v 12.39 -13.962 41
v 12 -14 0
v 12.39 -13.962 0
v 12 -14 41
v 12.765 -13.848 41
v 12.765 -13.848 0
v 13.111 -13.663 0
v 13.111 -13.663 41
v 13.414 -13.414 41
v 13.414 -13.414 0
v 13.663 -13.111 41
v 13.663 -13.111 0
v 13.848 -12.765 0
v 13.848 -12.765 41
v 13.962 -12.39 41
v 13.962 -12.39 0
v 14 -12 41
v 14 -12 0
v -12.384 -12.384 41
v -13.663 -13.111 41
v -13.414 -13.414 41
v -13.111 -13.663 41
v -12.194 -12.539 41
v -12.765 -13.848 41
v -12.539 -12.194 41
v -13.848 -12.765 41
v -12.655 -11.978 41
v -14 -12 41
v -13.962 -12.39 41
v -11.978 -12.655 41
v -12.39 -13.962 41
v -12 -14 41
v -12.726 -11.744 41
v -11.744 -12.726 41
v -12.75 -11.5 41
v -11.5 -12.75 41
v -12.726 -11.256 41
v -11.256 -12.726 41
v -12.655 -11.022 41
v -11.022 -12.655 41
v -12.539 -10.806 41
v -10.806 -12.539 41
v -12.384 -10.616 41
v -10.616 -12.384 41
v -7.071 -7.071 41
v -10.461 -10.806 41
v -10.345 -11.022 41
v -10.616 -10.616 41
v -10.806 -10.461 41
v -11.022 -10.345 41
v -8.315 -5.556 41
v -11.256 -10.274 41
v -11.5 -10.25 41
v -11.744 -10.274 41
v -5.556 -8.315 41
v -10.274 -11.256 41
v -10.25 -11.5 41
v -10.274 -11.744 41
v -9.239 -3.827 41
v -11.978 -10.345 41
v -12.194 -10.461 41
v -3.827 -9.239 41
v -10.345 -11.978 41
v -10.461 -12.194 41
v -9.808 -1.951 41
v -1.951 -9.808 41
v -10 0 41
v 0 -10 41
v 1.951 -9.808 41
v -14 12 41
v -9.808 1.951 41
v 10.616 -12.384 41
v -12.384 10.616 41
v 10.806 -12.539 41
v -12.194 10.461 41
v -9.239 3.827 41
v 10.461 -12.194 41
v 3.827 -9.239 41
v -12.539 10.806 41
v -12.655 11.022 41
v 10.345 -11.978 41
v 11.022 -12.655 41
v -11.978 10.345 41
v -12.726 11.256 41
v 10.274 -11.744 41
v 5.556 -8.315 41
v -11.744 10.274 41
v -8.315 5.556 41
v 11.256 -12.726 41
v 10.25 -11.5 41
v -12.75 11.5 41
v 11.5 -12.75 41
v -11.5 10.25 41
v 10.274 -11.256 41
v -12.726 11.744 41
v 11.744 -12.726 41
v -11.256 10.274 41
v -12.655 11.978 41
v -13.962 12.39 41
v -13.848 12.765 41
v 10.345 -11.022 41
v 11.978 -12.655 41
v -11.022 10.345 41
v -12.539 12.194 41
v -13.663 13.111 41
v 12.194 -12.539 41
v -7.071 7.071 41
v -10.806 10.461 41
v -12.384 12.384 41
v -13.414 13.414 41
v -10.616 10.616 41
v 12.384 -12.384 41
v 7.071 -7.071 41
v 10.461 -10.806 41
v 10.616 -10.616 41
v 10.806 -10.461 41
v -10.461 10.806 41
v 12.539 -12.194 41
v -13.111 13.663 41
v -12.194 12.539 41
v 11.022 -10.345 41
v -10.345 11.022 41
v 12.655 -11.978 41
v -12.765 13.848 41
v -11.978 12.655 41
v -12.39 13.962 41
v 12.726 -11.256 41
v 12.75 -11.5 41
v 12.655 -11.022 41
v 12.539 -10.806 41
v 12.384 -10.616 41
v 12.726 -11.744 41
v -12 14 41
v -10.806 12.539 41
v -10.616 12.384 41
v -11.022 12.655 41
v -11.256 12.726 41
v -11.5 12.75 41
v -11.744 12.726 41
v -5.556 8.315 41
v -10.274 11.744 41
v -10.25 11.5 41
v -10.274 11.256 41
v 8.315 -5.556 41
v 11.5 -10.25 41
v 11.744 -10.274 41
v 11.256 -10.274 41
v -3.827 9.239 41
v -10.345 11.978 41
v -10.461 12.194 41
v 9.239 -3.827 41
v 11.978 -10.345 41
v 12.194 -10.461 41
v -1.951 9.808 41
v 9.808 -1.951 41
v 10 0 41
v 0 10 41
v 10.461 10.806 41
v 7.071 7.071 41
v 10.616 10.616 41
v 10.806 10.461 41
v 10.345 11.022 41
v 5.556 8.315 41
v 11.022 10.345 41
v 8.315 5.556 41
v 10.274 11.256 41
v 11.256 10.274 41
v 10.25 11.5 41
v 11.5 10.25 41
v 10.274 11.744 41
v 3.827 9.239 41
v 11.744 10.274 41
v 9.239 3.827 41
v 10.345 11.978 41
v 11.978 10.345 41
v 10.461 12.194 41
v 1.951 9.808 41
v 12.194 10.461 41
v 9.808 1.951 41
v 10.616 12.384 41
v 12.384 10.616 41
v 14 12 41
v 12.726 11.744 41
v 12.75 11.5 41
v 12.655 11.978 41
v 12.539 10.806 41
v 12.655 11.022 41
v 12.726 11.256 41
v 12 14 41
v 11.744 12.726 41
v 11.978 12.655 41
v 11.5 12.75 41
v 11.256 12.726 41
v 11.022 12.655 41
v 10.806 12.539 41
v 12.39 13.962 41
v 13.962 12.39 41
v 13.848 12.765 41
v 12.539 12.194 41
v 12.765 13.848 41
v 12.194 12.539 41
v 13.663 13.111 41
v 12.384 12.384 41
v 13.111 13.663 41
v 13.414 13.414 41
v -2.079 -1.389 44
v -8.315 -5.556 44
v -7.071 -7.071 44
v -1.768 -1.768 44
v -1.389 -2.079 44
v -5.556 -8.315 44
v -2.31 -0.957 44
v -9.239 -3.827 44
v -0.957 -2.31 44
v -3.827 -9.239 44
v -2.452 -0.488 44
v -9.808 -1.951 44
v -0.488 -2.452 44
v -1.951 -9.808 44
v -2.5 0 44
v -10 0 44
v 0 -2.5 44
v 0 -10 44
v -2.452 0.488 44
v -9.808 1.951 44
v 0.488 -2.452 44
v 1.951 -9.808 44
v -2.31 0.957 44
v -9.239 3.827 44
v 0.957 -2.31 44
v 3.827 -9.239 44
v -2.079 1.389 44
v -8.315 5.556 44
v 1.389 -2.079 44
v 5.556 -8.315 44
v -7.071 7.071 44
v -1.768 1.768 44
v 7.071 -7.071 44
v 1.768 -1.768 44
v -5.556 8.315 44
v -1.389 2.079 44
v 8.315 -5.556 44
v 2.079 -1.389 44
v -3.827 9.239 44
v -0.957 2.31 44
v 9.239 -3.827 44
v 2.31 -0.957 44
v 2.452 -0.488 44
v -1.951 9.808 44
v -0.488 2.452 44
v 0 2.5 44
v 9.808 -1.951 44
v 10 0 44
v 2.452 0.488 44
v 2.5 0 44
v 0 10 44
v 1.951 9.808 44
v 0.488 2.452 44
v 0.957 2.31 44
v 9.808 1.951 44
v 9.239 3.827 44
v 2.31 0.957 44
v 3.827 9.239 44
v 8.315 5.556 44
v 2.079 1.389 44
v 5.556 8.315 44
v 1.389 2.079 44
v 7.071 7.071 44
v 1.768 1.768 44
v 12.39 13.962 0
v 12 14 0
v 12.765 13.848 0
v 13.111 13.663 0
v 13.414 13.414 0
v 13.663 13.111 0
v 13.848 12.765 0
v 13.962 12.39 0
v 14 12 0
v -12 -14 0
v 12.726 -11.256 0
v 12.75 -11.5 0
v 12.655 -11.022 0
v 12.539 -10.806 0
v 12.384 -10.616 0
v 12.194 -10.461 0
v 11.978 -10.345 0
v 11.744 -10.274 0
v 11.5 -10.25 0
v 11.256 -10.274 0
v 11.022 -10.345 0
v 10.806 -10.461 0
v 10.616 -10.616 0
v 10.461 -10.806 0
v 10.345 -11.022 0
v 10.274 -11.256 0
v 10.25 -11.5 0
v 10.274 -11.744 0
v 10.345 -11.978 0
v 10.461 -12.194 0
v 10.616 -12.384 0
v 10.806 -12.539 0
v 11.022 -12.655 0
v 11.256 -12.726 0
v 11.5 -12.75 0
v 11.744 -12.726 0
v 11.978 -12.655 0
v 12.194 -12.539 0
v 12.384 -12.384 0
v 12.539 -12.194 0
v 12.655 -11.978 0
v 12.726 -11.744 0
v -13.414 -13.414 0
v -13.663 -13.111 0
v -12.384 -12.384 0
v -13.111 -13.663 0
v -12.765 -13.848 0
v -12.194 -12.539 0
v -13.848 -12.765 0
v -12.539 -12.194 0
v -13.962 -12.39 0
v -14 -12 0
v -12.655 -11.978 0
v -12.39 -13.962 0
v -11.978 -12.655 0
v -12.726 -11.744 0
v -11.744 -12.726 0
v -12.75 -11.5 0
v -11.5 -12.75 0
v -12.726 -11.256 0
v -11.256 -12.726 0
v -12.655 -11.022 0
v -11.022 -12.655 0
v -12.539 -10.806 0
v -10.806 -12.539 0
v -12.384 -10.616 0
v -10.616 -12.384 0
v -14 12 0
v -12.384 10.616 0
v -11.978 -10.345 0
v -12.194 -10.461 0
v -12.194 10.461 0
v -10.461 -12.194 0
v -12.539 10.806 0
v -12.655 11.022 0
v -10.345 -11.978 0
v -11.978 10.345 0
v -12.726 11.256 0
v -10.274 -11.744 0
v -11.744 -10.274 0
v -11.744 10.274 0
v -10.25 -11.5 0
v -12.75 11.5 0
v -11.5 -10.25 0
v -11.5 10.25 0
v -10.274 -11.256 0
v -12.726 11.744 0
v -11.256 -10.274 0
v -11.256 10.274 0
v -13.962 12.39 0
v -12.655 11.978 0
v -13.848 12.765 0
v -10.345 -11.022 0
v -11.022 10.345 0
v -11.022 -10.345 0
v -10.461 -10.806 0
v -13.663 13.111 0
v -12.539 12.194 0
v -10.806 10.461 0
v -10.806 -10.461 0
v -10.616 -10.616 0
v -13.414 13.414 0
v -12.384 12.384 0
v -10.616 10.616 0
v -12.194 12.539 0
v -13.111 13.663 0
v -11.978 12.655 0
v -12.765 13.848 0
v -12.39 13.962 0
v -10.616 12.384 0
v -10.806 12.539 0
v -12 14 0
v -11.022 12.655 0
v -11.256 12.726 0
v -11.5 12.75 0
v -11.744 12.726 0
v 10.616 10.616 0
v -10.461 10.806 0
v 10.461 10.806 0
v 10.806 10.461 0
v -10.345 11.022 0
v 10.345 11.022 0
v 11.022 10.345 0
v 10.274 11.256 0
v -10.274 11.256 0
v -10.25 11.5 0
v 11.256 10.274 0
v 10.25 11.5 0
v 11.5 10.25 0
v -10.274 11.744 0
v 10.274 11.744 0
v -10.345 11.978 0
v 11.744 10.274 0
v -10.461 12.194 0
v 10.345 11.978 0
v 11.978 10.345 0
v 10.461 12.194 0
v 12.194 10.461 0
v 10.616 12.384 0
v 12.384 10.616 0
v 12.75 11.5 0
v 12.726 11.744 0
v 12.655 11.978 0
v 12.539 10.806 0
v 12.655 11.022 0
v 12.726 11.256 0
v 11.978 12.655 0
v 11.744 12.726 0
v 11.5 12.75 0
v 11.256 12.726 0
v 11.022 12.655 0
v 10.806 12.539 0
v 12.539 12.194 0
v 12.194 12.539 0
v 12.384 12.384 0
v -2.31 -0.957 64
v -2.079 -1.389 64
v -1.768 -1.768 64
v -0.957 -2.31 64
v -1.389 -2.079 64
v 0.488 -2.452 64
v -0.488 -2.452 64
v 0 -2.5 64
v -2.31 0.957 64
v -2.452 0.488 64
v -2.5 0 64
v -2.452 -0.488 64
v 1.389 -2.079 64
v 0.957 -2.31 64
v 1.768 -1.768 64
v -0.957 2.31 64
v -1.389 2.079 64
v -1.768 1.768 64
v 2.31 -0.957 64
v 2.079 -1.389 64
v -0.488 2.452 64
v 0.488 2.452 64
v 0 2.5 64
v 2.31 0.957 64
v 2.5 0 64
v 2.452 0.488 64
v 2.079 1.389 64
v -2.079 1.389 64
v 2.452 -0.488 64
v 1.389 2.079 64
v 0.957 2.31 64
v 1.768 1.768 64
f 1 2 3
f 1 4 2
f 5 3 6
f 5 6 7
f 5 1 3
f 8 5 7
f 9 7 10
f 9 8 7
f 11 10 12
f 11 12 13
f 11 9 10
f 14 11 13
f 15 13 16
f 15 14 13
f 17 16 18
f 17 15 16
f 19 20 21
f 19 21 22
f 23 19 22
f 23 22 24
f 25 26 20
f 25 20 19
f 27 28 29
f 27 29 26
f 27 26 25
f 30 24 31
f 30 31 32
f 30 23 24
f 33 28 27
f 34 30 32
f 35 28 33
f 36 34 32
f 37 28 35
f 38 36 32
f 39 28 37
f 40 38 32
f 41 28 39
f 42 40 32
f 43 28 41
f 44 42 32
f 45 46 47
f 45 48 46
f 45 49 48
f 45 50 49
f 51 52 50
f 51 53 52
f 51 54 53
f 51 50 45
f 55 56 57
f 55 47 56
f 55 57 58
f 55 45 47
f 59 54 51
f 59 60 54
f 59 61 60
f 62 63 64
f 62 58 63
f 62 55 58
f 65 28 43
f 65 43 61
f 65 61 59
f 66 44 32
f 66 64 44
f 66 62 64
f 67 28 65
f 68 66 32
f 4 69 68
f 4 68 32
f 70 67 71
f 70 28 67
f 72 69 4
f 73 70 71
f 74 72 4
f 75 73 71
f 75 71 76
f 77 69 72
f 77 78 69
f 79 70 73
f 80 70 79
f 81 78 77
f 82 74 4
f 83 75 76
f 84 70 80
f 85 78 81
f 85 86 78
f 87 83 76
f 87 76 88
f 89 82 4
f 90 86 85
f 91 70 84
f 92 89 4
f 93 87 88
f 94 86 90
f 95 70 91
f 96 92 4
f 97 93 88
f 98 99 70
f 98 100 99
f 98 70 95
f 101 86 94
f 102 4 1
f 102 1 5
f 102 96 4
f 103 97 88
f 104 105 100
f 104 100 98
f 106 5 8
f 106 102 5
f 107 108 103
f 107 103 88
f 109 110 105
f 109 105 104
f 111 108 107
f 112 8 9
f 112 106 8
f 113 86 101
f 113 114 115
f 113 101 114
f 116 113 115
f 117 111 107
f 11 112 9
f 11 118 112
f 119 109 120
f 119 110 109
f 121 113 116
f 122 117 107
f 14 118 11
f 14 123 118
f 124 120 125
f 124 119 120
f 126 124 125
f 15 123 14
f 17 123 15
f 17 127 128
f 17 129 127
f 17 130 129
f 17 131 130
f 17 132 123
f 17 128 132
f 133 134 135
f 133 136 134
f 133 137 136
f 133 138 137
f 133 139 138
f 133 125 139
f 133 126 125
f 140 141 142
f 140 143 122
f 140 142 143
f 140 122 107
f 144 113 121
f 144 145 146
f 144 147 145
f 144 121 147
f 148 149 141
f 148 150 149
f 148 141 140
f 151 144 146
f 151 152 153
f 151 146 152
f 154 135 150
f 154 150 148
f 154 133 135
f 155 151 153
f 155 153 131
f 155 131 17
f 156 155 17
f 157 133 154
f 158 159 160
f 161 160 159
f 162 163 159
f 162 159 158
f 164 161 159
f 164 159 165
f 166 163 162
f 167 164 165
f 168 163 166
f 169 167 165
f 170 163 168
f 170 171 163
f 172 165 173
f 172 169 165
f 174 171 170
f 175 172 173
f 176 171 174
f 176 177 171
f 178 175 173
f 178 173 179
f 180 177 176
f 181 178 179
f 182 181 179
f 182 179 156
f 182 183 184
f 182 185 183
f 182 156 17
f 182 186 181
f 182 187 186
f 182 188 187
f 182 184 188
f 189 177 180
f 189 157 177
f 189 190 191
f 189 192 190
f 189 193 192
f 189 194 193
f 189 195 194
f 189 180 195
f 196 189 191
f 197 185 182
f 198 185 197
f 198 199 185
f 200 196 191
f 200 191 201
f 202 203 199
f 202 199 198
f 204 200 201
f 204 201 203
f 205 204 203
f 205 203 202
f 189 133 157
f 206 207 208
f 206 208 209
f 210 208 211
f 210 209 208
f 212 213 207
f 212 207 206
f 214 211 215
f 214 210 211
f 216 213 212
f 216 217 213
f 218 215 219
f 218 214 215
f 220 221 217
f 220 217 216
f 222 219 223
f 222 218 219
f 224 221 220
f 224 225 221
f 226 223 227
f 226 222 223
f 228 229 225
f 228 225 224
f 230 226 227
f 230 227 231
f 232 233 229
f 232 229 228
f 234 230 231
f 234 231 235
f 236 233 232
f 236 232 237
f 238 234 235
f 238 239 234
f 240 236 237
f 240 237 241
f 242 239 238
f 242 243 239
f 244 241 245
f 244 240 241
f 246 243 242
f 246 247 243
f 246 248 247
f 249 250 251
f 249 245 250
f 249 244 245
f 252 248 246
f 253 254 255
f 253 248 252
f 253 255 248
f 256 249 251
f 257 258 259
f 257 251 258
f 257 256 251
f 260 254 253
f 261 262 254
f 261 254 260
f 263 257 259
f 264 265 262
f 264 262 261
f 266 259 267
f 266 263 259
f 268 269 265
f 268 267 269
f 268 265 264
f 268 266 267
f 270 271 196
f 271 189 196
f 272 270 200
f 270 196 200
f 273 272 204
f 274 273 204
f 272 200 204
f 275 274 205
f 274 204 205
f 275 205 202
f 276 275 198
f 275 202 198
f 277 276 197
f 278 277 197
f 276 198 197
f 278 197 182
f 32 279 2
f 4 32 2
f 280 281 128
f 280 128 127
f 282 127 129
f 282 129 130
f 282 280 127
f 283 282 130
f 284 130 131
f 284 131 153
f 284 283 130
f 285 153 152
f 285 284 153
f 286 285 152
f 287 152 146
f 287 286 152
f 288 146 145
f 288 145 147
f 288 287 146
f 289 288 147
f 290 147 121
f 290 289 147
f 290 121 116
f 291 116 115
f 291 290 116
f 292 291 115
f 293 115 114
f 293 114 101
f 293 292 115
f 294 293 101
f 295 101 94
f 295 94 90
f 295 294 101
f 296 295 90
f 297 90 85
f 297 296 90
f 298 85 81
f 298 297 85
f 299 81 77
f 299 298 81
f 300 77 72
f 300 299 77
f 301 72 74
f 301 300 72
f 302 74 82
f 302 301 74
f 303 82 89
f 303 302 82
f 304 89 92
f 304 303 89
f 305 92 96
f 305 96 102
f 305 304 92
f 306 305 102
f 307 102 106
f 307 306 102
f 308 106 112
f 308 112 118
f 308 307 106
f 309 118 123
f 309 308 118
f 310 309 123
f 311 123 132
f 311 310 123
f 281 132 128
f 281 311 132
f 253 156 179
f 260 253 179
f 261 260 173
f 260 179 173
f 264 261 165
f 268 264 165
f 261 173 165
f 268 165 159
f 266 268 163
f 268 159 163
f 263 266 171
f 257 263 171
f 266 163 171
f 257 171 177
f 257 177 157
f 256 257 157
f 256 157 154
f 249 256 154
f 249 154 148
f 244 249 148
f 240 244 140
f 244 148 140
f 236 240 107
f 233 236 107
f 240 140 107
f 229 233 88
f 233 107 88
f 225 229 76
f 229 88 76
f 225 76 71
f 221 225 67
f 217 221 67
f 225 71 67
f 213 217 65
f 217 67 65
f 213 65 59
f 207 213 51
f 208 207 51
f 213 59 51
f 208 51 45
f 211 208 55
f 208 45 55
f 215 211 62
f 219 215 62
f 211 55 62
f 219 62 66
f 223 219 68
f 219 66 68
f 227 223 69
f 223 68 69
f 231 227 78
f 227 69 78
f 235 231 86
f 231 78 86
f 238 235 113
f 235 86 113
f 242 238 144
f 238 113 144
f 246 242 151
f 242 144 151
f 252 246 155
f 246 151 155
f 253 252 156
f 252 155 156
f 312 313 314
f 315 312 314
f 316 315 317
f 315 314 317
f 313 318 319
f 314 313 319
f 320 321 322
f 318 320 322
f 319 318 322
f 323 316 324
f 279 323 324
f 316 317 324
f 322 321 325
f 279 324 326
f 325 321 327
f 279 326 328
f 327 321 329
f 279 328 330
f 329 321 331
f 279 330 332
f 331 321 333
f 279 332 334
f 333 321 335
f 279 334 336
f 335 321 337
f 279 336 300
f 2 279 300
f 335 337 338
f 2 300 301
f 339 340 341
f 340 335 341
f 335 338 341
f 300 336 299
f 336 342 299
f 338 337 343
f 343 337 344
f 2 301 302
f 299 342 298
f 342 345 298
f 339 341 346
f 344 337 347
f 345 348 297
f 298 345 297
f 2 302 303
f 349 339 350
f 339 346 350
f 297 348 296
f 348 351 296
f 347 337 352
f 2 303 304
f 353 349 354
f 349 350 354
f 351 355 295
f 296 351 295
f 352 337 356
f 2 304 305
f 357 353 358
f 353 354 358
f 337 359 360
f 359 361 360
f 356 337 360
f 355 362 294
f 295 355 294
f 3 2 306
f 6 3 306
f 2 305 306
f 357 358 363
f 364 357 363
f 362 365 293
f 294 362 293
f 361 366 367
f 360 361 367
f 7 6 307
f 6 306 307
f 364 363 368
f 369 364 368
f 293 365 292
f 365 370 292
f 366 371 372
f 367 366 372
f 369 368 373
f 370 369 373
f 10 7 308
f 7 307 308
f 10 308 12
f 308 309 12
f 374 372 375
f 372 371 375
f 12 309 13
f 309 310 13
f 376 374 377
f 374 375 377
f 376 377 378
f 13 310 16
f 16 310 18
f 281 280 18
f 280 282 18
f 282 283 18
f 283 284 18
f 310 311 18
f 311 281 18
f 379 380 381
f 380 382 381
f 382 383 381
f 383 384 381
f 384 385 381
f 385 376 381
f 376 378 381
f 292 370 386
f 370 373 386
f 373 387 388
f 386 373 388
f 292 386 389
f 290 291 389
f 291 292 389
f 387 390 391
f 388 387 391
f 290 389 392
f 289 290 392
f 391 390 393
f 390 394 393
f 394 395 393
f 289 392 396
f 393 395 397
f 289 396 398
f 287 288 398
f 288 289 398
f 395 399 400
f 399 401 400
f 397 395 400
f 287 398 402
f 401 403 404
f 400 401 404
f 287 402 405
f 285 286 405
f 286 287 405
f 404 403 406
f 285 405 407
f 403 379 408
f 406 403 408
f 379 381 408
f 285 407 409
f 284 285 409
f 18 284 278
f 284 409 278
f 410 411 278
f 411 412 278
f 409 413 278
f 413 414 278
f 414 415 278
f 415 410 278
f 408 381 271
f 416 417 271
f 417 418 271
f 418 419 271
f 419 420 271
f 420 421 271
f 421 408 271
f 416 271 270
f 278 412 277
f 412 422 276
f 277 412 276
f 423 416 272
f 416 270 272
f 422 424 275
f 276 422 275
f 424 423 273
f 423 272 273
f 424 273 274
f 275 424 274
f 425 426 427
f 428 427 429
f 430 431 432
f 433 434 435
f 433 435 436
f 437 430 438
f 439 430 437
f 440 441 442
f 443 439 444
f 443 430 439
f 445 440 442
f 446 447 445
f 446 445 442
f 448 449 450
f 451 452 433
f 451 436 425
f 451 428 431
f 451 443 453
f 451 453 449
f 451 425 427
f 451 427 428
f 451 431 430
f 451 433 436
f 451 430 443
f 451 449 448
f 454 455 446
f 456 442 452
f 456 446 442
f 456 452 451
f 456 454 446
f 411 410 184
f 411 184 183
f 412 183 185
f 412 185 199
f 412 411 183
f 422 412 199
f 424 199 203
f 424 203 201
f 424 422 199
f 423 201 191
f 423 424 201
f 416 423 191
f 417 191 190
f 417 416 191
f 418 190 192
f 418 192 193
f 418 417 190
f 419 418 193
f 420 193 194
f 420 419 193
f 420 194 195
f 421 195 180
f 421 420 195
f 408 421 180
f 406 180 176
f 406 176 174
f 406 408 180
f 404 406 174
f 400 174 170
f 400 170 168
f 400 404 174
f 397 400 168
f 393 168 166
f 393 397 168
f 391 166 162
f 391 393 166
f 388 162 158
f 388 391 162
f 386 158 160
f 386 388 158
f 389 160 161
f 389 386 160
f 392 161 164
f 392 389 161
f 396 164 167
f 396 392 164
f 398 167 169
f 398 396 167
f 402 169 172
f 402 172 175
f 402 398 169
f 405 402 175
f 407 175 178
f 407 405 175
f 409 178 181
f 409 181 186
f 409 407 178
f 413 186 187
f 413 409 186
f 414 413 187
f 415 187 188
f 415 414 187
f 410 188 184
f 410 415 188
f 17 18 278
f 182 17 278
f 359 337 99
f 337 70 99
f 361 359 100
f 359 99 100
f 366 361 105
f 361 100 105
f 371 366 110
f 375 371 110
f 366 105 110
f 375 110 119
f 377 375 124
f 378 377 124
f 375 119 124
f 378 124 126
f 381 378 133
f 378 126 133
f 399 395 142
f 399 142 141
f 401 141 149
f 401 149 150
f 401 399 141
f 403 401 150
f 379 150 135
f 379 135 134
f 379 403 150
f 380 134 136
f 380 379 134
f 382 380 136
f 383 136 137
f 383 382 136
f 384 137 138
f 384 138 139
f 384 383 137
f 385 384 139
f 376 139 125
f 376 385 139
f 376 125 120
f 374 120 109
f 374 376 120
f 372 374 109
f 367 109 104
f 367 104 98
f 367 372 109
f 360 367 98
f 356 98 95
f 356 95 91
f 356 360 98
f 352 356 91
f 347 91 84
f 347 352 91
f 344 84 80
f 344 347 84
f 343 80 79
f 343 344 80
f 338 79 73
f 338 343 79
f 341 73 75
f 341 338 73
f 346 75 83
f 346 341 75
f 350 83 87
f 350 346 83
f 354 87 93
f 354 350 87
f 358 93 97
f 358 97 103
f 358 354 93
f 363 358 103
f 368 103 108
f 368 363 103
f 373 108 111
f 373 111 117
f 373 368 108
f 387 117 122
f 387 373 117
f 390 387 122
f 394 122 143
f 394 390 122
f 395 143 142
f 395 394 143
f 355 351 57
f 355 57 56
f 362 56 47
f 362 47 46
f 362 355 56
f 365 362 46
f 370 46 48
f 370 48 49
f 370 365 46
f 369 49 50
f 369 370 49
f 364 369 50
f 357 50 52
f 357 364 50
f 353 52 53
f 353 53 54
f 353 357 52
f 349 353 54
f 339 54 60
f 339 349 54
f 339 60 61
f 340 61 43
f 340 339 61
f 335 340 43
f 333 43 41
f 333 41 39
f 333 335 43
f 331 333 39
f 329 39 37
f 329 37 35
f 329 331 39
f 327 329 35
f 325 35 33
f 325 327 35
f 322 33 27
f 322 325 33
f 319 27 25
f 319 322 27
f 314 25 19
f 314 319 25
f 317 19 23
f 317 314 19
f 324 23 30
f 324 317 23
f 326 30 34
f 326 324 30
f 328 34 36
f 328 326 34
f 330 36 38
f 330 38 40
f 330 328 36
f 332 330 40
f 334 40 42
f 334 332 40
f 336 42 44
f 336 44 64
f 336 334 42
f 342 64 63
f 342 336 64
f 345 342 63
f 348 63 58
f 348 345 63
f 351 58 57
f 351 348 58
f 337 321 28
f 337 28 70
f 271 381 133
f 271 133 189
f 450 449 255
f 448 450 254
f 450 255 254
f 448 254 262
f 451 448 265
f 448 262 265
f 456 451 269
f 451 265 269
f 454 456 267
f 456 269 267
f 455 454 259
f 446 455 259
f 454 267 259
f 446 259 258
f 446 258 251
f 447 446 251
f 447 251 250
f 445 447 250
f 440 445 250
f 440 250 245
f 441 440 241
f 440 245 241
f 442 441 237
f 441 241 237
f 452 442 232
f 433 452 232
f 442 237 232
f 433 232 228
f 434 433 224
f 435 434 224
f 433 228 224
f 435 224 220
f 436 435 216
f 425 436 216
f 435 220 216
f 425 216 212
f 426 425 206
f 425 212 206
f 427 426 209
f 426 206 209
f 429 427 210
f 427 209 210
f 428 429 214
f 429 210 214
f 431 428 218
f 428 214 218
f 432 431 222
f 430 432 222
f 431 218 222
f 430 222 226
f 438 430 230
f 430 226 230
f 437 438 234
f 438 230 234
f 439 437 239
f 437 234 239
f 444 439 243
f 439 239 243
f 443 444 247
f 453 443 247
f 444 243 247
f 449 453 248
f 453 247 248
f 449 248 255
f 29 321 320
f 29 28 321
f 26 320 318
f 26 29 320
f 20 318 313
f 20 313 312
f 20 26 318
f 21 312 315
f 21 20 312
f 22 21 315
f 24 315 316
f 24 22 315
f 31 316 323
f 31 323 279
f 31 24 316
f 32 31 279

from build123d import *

# Parameters (mm, degrees)
SKETCH_1_W      = 28
SKETCH_1_H      = 28
SKETCH_1_R      = 1.25
EXTRUDE_1_DEPTH = 41
SKETCH_2_R      = 10
EXTRUDE_2_DEPTH = 3
SKETCH_3_R      = 2.5
EXTRUDE_3_DEPTH = 20
FILLET_1_R      = 2


with BuildPart() as part:
    # 草图1 → 凸台-拉伸1 (new body)
    with BuildSketch(Plane.XY):
        Rectangle(SKETCH_1_W, SKETCH_1_H)
        with Locations((-11.5, 11.5)):
            Circle(SKETCH_1_R, mode=Mode.SUBTRACT)
        with Locations((11.5, 11.5)):
            Circle(SKETCH_1_R, mode=Mode.SUBTRACT)
        with Locations((11.5, -11.5)):
            Circle(SKETCH_1_R, mode=Mode.SUBTRACT)
        with Locations((-11.5, -11.5)):
            Circle(SKETCH_1_R, mode=Mode.SUBTRACT)
    extrude(amount=EXTRUDE_1_DEPTH)

    # 草图2 → 凸台-拉伸2 (add)
    with BuildSketch(Plane.XY.offset(41)):
        Circle(SKETCH_2_R)
    extrude(amount=EXTRUDE_2_DEPTH)

    # 草图3 → 凸台-拉伸3 (add)
    with BuildSketch(Plane.XY.offset(44)):
        Circle(SKETCH_3_R)
    extrude(amount=EXTRUDE_3_DEPTH)

    # 圆角1
    fillet_1_edges = [part.edges().sort_by_distance(p)[0] for p in [
        (14, -14, 20.5),
        (-14, -14, 20.5),
        (-14, 14, 20.5),
        (14, 14, 20.5),
    ]]
    fillet(fillet_1_edges, radius=FILLET_1_R)


solid = part.part
